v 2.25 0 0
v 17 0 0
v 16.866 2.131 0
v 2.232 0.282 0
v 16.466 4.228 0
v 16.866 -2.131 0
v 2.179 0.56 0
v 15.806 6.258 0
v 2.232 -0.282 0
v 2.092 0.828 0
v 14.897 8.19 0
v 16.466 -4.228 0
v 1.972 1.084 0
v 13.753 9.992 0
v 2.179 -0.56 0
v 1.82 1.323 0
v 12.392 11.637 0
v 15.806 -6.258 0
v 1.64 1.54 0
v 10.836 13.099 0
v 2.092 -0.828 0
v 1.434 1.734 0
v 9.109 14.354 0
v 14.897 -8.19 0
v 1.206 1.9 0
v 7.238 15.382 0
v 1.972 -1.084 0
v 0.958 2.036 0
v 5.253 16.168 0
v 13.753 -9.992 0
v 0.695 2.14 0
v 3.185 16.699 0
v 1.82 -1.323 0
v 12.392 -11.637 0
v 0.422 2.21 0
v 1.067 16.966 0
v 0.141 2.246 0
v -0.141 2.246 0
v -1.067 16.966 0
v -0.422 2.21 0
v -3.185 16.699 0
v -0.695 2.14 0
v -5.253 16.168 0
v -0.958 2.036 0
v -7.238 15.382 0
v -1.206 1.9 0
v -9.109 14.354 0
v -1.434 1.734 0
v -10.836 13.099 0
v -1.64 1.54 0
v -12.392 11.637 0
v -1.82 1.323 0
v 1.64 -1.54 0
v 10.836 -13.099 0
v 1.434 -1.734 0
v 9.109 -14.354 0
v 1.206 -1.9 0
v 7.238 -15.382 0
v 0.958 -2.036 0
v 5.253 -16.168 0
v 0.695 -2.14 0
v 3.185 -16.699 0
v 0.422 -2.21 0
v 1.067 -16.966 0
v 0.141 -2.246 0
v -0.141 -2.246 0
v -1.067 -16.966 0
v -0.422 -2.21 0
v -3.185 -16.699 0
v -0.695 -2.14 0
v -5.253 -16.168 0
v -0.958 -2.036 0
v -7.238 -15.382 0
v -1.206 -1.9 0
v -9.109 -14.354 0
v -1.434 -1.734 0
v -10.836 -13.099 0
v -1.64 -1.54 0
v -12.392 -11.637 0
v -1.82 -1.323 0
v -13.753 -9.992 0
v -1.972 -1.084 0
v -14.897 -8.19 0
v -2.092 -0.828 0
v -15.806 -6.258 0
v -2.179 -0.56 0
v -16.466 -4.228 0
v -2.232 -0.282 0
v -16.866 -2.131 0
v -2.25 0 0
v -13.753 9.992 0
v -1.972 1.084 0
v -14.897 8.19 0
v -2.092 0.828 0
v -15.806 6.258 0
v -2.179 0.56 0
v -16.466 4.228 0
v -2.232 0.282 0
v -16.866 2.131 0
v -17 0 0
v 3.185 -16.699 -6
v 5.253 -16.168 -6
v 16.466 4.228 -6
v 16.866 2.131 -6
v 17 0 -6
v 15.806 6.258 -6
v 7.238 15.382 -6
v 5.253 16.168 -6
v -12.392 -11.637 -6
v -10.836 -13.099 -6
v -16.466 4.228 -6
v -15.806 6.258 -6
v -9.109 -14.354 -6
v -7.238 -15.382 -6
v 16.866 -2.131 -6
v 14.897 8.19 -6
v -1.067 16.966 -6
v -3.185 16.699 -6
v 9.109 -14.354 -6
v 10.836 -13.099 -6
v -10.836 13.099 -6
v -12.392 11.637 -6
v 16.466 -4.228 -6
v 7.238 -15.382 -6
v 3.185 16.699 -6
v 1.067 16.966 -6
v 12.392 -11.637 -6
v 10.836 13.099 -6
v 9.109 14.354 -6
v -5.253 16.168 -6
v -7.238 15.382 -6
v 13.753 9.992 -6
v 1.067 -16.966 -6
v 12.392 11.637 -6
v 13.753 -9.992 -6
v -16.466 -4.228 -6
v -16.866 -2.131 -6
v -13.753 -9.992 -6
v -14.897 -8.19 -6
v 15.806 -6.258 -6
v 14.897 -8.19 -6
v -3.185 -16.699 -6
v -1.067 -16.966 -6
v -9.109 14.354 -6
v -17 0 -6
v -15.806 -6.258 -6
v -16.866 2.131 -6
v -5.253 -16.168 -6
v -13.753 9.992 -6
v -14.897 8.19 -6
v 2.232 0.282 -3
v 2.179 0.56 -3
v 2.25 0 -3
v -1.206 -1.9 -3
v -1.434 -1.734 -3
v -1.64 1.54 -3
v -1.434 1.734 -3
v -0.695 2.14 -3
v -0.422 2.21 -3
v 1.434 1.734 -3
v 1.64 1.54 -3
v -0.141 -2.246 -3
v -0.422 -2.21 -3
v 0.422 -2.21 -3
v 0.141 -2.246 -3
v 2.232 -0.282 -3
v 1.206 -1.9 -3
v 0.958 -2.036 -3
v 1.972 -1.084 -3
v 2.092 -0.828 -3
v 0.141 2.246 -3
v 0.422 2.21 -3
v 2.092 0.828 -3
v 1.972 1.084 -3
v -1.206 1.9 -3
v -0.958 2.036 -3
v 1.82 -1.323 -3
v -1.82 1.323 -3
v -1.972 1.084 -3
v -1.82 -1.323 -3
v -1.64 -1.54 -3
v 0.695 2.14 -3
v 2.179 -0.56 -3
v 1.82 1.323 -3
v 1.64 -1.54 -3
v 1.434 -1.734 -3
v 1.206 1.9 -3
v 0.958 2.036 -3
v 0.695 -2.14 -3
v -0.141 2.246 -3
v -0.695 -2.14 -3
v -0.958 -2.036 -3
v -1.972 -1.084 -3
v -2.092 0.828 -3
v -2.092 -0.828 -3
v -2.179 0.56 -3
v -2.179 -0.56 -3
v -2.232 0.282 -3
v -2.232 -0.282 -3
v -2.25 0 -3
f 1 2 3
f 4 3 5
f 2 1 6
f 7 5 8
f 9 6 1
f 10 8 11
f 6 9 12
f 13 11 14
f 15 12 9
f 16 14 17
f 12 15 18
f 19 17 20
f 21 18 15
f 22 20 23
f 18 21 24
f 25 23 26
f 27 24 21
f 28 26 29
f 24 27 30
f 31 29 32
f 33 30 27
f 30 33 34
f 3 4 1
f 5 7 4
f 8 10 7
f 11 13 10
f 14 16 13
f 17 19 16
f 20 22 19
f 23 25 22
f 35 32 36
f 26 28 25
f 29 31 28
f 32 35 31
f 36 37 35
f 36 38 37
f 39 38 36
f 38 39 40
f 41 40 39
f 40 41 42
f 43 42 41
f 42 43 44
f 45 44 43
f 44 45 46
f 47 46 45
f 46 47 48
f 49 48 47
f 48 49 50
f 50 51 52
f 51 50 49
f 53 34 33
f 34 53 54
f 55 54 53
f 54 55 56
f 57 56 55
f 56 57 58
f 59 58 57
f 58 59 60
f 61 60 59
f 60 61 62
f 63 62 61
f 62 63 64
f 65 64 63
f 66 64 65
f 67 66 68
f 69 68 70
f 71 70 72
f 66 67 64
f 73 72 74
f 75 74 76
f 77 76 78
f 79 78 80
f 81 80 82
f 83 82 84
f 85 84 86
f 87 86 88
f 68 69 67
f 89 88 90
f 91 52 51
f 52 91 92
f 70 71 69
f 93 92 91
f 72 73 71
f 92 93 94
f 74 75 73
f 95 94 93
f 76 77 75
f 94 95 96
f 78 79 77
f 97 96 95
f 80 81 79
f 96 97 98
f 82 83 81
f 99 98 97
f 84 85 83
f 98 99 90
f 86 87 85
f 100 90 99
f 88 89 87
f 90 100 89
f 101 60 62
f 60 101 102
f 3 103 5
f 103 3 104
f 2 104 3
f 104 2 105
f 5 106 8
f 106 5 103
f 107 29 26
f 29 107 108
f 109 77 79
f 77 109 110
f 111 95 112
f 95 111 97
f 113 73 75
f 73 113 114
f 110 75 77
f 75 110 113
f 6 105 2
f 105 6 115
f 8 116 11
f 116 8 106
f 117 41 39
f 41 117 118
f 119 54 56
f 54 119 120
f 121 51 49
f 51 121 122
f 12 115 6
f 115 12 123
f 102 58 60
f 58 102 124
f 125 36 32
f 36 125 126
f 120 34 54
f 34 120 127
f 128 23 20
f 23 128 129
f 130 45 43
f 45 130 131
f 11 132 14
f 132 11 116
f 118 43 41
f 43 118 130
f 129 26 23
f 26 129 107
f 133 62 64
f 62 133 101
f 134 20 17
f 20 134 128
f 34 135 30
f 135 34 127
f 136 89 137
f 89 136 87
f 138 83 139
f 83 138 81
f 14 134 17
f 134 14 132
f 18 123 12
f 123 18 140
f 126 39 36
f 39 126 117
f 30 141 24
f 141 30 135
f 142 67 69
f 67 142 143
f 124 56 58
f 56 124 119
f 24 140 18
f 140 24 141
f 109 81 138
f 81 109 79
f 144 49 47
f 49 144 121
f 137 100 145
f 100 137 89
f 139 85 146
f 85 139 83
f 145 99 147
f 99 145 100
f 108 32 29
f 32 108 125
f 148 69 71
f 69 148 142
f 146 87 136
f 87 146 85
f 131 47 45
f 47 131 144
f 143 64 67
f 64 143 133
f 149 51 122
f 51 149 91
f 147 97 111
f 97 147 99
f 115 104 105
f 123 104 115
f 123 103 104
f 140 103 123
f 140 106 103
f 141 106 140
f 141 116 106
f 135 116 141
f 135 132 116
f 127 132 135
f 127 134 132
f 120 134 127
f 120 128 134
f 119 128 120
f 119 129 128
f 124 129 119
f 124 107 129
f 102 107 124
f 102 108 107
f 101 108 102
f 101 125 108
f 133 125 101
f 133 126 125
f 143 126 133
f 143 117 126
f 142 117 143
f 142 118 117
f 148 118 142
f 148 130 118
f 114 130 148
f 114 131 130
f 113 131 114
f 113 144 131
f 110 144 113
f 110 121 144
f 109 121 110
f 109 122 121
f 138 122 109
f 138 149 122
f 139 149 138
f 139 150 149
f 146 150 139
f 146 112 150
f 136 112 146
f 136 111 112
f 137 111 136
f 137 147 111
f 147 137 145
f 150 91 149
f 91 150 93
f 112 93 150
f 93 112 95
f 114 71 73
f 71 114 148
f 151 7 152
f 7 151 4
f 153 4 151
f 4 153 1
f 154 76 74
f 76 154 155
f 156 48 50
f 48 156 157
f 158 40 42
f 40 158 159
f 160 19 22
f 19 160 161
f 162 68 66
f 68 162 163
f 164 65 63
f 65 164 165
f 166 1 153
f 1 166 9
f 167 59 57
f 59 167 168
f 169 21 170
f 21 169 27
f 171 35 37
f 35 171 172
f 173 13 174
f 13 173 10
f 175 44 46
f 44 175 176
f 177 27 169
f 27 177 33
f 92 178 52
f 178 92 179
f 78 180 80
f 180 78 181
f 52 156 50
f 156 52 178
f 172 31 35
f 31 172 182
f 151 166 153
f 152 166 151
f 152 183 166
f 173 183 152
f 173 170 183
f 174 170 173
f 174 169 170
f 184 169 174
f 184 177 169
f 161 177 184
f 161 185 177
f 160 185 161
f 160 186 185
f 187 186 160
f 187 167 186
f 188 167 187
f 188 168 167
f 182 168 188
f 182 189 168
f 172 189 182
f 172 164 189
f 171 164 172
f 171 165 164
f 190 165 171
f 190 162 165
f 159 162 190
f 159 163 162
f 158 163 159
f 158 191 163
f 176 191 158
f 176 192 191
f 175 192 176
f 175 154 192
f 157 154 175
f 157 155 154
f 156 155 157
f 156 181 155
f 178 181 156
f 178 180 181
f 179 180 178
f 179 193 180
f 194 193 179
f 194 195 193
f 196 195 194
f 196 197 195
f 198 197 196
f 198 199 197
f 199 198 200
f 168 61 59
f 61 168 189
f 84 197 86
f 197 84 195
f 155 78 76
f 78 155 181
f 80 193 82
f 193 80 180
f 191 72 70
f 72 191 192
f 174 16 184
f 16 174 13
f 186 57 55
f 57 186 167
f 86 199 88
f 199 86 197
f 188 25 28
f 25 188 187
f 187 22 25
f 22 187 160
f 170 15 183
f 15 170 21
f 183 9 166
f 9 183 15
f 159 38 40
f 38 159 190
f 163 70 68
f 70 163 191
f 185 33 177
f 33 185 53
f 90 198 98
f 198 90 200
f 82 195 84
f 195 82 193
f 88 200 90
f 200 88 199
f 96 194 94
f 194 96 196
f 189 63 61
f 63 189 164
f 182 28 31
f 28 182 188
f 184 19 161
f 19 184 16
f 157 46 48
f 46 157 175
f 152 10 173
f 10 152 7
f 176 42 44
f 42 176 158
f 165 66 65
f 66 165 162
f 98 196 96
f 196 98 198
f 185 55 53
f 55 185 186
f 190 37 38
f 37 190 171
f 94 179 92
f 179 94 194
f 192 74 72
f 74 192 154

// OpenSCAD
$fn = 50;


difference() {
	union() {
		translate(v = [0, 0, -3.0000000000]) {
			cylinder(h = 3, r = 7.0000000000);
		}
		translate(v = [0, 0, -6.0000000000]) {
			cylinder(h = 6, r = 17.0000000000);
		}
	}
	union() {
		#translate(v = [0, 0, -3]) {
			cylinder(h = 3, r = 2.2500000000);
		}
	}
}
